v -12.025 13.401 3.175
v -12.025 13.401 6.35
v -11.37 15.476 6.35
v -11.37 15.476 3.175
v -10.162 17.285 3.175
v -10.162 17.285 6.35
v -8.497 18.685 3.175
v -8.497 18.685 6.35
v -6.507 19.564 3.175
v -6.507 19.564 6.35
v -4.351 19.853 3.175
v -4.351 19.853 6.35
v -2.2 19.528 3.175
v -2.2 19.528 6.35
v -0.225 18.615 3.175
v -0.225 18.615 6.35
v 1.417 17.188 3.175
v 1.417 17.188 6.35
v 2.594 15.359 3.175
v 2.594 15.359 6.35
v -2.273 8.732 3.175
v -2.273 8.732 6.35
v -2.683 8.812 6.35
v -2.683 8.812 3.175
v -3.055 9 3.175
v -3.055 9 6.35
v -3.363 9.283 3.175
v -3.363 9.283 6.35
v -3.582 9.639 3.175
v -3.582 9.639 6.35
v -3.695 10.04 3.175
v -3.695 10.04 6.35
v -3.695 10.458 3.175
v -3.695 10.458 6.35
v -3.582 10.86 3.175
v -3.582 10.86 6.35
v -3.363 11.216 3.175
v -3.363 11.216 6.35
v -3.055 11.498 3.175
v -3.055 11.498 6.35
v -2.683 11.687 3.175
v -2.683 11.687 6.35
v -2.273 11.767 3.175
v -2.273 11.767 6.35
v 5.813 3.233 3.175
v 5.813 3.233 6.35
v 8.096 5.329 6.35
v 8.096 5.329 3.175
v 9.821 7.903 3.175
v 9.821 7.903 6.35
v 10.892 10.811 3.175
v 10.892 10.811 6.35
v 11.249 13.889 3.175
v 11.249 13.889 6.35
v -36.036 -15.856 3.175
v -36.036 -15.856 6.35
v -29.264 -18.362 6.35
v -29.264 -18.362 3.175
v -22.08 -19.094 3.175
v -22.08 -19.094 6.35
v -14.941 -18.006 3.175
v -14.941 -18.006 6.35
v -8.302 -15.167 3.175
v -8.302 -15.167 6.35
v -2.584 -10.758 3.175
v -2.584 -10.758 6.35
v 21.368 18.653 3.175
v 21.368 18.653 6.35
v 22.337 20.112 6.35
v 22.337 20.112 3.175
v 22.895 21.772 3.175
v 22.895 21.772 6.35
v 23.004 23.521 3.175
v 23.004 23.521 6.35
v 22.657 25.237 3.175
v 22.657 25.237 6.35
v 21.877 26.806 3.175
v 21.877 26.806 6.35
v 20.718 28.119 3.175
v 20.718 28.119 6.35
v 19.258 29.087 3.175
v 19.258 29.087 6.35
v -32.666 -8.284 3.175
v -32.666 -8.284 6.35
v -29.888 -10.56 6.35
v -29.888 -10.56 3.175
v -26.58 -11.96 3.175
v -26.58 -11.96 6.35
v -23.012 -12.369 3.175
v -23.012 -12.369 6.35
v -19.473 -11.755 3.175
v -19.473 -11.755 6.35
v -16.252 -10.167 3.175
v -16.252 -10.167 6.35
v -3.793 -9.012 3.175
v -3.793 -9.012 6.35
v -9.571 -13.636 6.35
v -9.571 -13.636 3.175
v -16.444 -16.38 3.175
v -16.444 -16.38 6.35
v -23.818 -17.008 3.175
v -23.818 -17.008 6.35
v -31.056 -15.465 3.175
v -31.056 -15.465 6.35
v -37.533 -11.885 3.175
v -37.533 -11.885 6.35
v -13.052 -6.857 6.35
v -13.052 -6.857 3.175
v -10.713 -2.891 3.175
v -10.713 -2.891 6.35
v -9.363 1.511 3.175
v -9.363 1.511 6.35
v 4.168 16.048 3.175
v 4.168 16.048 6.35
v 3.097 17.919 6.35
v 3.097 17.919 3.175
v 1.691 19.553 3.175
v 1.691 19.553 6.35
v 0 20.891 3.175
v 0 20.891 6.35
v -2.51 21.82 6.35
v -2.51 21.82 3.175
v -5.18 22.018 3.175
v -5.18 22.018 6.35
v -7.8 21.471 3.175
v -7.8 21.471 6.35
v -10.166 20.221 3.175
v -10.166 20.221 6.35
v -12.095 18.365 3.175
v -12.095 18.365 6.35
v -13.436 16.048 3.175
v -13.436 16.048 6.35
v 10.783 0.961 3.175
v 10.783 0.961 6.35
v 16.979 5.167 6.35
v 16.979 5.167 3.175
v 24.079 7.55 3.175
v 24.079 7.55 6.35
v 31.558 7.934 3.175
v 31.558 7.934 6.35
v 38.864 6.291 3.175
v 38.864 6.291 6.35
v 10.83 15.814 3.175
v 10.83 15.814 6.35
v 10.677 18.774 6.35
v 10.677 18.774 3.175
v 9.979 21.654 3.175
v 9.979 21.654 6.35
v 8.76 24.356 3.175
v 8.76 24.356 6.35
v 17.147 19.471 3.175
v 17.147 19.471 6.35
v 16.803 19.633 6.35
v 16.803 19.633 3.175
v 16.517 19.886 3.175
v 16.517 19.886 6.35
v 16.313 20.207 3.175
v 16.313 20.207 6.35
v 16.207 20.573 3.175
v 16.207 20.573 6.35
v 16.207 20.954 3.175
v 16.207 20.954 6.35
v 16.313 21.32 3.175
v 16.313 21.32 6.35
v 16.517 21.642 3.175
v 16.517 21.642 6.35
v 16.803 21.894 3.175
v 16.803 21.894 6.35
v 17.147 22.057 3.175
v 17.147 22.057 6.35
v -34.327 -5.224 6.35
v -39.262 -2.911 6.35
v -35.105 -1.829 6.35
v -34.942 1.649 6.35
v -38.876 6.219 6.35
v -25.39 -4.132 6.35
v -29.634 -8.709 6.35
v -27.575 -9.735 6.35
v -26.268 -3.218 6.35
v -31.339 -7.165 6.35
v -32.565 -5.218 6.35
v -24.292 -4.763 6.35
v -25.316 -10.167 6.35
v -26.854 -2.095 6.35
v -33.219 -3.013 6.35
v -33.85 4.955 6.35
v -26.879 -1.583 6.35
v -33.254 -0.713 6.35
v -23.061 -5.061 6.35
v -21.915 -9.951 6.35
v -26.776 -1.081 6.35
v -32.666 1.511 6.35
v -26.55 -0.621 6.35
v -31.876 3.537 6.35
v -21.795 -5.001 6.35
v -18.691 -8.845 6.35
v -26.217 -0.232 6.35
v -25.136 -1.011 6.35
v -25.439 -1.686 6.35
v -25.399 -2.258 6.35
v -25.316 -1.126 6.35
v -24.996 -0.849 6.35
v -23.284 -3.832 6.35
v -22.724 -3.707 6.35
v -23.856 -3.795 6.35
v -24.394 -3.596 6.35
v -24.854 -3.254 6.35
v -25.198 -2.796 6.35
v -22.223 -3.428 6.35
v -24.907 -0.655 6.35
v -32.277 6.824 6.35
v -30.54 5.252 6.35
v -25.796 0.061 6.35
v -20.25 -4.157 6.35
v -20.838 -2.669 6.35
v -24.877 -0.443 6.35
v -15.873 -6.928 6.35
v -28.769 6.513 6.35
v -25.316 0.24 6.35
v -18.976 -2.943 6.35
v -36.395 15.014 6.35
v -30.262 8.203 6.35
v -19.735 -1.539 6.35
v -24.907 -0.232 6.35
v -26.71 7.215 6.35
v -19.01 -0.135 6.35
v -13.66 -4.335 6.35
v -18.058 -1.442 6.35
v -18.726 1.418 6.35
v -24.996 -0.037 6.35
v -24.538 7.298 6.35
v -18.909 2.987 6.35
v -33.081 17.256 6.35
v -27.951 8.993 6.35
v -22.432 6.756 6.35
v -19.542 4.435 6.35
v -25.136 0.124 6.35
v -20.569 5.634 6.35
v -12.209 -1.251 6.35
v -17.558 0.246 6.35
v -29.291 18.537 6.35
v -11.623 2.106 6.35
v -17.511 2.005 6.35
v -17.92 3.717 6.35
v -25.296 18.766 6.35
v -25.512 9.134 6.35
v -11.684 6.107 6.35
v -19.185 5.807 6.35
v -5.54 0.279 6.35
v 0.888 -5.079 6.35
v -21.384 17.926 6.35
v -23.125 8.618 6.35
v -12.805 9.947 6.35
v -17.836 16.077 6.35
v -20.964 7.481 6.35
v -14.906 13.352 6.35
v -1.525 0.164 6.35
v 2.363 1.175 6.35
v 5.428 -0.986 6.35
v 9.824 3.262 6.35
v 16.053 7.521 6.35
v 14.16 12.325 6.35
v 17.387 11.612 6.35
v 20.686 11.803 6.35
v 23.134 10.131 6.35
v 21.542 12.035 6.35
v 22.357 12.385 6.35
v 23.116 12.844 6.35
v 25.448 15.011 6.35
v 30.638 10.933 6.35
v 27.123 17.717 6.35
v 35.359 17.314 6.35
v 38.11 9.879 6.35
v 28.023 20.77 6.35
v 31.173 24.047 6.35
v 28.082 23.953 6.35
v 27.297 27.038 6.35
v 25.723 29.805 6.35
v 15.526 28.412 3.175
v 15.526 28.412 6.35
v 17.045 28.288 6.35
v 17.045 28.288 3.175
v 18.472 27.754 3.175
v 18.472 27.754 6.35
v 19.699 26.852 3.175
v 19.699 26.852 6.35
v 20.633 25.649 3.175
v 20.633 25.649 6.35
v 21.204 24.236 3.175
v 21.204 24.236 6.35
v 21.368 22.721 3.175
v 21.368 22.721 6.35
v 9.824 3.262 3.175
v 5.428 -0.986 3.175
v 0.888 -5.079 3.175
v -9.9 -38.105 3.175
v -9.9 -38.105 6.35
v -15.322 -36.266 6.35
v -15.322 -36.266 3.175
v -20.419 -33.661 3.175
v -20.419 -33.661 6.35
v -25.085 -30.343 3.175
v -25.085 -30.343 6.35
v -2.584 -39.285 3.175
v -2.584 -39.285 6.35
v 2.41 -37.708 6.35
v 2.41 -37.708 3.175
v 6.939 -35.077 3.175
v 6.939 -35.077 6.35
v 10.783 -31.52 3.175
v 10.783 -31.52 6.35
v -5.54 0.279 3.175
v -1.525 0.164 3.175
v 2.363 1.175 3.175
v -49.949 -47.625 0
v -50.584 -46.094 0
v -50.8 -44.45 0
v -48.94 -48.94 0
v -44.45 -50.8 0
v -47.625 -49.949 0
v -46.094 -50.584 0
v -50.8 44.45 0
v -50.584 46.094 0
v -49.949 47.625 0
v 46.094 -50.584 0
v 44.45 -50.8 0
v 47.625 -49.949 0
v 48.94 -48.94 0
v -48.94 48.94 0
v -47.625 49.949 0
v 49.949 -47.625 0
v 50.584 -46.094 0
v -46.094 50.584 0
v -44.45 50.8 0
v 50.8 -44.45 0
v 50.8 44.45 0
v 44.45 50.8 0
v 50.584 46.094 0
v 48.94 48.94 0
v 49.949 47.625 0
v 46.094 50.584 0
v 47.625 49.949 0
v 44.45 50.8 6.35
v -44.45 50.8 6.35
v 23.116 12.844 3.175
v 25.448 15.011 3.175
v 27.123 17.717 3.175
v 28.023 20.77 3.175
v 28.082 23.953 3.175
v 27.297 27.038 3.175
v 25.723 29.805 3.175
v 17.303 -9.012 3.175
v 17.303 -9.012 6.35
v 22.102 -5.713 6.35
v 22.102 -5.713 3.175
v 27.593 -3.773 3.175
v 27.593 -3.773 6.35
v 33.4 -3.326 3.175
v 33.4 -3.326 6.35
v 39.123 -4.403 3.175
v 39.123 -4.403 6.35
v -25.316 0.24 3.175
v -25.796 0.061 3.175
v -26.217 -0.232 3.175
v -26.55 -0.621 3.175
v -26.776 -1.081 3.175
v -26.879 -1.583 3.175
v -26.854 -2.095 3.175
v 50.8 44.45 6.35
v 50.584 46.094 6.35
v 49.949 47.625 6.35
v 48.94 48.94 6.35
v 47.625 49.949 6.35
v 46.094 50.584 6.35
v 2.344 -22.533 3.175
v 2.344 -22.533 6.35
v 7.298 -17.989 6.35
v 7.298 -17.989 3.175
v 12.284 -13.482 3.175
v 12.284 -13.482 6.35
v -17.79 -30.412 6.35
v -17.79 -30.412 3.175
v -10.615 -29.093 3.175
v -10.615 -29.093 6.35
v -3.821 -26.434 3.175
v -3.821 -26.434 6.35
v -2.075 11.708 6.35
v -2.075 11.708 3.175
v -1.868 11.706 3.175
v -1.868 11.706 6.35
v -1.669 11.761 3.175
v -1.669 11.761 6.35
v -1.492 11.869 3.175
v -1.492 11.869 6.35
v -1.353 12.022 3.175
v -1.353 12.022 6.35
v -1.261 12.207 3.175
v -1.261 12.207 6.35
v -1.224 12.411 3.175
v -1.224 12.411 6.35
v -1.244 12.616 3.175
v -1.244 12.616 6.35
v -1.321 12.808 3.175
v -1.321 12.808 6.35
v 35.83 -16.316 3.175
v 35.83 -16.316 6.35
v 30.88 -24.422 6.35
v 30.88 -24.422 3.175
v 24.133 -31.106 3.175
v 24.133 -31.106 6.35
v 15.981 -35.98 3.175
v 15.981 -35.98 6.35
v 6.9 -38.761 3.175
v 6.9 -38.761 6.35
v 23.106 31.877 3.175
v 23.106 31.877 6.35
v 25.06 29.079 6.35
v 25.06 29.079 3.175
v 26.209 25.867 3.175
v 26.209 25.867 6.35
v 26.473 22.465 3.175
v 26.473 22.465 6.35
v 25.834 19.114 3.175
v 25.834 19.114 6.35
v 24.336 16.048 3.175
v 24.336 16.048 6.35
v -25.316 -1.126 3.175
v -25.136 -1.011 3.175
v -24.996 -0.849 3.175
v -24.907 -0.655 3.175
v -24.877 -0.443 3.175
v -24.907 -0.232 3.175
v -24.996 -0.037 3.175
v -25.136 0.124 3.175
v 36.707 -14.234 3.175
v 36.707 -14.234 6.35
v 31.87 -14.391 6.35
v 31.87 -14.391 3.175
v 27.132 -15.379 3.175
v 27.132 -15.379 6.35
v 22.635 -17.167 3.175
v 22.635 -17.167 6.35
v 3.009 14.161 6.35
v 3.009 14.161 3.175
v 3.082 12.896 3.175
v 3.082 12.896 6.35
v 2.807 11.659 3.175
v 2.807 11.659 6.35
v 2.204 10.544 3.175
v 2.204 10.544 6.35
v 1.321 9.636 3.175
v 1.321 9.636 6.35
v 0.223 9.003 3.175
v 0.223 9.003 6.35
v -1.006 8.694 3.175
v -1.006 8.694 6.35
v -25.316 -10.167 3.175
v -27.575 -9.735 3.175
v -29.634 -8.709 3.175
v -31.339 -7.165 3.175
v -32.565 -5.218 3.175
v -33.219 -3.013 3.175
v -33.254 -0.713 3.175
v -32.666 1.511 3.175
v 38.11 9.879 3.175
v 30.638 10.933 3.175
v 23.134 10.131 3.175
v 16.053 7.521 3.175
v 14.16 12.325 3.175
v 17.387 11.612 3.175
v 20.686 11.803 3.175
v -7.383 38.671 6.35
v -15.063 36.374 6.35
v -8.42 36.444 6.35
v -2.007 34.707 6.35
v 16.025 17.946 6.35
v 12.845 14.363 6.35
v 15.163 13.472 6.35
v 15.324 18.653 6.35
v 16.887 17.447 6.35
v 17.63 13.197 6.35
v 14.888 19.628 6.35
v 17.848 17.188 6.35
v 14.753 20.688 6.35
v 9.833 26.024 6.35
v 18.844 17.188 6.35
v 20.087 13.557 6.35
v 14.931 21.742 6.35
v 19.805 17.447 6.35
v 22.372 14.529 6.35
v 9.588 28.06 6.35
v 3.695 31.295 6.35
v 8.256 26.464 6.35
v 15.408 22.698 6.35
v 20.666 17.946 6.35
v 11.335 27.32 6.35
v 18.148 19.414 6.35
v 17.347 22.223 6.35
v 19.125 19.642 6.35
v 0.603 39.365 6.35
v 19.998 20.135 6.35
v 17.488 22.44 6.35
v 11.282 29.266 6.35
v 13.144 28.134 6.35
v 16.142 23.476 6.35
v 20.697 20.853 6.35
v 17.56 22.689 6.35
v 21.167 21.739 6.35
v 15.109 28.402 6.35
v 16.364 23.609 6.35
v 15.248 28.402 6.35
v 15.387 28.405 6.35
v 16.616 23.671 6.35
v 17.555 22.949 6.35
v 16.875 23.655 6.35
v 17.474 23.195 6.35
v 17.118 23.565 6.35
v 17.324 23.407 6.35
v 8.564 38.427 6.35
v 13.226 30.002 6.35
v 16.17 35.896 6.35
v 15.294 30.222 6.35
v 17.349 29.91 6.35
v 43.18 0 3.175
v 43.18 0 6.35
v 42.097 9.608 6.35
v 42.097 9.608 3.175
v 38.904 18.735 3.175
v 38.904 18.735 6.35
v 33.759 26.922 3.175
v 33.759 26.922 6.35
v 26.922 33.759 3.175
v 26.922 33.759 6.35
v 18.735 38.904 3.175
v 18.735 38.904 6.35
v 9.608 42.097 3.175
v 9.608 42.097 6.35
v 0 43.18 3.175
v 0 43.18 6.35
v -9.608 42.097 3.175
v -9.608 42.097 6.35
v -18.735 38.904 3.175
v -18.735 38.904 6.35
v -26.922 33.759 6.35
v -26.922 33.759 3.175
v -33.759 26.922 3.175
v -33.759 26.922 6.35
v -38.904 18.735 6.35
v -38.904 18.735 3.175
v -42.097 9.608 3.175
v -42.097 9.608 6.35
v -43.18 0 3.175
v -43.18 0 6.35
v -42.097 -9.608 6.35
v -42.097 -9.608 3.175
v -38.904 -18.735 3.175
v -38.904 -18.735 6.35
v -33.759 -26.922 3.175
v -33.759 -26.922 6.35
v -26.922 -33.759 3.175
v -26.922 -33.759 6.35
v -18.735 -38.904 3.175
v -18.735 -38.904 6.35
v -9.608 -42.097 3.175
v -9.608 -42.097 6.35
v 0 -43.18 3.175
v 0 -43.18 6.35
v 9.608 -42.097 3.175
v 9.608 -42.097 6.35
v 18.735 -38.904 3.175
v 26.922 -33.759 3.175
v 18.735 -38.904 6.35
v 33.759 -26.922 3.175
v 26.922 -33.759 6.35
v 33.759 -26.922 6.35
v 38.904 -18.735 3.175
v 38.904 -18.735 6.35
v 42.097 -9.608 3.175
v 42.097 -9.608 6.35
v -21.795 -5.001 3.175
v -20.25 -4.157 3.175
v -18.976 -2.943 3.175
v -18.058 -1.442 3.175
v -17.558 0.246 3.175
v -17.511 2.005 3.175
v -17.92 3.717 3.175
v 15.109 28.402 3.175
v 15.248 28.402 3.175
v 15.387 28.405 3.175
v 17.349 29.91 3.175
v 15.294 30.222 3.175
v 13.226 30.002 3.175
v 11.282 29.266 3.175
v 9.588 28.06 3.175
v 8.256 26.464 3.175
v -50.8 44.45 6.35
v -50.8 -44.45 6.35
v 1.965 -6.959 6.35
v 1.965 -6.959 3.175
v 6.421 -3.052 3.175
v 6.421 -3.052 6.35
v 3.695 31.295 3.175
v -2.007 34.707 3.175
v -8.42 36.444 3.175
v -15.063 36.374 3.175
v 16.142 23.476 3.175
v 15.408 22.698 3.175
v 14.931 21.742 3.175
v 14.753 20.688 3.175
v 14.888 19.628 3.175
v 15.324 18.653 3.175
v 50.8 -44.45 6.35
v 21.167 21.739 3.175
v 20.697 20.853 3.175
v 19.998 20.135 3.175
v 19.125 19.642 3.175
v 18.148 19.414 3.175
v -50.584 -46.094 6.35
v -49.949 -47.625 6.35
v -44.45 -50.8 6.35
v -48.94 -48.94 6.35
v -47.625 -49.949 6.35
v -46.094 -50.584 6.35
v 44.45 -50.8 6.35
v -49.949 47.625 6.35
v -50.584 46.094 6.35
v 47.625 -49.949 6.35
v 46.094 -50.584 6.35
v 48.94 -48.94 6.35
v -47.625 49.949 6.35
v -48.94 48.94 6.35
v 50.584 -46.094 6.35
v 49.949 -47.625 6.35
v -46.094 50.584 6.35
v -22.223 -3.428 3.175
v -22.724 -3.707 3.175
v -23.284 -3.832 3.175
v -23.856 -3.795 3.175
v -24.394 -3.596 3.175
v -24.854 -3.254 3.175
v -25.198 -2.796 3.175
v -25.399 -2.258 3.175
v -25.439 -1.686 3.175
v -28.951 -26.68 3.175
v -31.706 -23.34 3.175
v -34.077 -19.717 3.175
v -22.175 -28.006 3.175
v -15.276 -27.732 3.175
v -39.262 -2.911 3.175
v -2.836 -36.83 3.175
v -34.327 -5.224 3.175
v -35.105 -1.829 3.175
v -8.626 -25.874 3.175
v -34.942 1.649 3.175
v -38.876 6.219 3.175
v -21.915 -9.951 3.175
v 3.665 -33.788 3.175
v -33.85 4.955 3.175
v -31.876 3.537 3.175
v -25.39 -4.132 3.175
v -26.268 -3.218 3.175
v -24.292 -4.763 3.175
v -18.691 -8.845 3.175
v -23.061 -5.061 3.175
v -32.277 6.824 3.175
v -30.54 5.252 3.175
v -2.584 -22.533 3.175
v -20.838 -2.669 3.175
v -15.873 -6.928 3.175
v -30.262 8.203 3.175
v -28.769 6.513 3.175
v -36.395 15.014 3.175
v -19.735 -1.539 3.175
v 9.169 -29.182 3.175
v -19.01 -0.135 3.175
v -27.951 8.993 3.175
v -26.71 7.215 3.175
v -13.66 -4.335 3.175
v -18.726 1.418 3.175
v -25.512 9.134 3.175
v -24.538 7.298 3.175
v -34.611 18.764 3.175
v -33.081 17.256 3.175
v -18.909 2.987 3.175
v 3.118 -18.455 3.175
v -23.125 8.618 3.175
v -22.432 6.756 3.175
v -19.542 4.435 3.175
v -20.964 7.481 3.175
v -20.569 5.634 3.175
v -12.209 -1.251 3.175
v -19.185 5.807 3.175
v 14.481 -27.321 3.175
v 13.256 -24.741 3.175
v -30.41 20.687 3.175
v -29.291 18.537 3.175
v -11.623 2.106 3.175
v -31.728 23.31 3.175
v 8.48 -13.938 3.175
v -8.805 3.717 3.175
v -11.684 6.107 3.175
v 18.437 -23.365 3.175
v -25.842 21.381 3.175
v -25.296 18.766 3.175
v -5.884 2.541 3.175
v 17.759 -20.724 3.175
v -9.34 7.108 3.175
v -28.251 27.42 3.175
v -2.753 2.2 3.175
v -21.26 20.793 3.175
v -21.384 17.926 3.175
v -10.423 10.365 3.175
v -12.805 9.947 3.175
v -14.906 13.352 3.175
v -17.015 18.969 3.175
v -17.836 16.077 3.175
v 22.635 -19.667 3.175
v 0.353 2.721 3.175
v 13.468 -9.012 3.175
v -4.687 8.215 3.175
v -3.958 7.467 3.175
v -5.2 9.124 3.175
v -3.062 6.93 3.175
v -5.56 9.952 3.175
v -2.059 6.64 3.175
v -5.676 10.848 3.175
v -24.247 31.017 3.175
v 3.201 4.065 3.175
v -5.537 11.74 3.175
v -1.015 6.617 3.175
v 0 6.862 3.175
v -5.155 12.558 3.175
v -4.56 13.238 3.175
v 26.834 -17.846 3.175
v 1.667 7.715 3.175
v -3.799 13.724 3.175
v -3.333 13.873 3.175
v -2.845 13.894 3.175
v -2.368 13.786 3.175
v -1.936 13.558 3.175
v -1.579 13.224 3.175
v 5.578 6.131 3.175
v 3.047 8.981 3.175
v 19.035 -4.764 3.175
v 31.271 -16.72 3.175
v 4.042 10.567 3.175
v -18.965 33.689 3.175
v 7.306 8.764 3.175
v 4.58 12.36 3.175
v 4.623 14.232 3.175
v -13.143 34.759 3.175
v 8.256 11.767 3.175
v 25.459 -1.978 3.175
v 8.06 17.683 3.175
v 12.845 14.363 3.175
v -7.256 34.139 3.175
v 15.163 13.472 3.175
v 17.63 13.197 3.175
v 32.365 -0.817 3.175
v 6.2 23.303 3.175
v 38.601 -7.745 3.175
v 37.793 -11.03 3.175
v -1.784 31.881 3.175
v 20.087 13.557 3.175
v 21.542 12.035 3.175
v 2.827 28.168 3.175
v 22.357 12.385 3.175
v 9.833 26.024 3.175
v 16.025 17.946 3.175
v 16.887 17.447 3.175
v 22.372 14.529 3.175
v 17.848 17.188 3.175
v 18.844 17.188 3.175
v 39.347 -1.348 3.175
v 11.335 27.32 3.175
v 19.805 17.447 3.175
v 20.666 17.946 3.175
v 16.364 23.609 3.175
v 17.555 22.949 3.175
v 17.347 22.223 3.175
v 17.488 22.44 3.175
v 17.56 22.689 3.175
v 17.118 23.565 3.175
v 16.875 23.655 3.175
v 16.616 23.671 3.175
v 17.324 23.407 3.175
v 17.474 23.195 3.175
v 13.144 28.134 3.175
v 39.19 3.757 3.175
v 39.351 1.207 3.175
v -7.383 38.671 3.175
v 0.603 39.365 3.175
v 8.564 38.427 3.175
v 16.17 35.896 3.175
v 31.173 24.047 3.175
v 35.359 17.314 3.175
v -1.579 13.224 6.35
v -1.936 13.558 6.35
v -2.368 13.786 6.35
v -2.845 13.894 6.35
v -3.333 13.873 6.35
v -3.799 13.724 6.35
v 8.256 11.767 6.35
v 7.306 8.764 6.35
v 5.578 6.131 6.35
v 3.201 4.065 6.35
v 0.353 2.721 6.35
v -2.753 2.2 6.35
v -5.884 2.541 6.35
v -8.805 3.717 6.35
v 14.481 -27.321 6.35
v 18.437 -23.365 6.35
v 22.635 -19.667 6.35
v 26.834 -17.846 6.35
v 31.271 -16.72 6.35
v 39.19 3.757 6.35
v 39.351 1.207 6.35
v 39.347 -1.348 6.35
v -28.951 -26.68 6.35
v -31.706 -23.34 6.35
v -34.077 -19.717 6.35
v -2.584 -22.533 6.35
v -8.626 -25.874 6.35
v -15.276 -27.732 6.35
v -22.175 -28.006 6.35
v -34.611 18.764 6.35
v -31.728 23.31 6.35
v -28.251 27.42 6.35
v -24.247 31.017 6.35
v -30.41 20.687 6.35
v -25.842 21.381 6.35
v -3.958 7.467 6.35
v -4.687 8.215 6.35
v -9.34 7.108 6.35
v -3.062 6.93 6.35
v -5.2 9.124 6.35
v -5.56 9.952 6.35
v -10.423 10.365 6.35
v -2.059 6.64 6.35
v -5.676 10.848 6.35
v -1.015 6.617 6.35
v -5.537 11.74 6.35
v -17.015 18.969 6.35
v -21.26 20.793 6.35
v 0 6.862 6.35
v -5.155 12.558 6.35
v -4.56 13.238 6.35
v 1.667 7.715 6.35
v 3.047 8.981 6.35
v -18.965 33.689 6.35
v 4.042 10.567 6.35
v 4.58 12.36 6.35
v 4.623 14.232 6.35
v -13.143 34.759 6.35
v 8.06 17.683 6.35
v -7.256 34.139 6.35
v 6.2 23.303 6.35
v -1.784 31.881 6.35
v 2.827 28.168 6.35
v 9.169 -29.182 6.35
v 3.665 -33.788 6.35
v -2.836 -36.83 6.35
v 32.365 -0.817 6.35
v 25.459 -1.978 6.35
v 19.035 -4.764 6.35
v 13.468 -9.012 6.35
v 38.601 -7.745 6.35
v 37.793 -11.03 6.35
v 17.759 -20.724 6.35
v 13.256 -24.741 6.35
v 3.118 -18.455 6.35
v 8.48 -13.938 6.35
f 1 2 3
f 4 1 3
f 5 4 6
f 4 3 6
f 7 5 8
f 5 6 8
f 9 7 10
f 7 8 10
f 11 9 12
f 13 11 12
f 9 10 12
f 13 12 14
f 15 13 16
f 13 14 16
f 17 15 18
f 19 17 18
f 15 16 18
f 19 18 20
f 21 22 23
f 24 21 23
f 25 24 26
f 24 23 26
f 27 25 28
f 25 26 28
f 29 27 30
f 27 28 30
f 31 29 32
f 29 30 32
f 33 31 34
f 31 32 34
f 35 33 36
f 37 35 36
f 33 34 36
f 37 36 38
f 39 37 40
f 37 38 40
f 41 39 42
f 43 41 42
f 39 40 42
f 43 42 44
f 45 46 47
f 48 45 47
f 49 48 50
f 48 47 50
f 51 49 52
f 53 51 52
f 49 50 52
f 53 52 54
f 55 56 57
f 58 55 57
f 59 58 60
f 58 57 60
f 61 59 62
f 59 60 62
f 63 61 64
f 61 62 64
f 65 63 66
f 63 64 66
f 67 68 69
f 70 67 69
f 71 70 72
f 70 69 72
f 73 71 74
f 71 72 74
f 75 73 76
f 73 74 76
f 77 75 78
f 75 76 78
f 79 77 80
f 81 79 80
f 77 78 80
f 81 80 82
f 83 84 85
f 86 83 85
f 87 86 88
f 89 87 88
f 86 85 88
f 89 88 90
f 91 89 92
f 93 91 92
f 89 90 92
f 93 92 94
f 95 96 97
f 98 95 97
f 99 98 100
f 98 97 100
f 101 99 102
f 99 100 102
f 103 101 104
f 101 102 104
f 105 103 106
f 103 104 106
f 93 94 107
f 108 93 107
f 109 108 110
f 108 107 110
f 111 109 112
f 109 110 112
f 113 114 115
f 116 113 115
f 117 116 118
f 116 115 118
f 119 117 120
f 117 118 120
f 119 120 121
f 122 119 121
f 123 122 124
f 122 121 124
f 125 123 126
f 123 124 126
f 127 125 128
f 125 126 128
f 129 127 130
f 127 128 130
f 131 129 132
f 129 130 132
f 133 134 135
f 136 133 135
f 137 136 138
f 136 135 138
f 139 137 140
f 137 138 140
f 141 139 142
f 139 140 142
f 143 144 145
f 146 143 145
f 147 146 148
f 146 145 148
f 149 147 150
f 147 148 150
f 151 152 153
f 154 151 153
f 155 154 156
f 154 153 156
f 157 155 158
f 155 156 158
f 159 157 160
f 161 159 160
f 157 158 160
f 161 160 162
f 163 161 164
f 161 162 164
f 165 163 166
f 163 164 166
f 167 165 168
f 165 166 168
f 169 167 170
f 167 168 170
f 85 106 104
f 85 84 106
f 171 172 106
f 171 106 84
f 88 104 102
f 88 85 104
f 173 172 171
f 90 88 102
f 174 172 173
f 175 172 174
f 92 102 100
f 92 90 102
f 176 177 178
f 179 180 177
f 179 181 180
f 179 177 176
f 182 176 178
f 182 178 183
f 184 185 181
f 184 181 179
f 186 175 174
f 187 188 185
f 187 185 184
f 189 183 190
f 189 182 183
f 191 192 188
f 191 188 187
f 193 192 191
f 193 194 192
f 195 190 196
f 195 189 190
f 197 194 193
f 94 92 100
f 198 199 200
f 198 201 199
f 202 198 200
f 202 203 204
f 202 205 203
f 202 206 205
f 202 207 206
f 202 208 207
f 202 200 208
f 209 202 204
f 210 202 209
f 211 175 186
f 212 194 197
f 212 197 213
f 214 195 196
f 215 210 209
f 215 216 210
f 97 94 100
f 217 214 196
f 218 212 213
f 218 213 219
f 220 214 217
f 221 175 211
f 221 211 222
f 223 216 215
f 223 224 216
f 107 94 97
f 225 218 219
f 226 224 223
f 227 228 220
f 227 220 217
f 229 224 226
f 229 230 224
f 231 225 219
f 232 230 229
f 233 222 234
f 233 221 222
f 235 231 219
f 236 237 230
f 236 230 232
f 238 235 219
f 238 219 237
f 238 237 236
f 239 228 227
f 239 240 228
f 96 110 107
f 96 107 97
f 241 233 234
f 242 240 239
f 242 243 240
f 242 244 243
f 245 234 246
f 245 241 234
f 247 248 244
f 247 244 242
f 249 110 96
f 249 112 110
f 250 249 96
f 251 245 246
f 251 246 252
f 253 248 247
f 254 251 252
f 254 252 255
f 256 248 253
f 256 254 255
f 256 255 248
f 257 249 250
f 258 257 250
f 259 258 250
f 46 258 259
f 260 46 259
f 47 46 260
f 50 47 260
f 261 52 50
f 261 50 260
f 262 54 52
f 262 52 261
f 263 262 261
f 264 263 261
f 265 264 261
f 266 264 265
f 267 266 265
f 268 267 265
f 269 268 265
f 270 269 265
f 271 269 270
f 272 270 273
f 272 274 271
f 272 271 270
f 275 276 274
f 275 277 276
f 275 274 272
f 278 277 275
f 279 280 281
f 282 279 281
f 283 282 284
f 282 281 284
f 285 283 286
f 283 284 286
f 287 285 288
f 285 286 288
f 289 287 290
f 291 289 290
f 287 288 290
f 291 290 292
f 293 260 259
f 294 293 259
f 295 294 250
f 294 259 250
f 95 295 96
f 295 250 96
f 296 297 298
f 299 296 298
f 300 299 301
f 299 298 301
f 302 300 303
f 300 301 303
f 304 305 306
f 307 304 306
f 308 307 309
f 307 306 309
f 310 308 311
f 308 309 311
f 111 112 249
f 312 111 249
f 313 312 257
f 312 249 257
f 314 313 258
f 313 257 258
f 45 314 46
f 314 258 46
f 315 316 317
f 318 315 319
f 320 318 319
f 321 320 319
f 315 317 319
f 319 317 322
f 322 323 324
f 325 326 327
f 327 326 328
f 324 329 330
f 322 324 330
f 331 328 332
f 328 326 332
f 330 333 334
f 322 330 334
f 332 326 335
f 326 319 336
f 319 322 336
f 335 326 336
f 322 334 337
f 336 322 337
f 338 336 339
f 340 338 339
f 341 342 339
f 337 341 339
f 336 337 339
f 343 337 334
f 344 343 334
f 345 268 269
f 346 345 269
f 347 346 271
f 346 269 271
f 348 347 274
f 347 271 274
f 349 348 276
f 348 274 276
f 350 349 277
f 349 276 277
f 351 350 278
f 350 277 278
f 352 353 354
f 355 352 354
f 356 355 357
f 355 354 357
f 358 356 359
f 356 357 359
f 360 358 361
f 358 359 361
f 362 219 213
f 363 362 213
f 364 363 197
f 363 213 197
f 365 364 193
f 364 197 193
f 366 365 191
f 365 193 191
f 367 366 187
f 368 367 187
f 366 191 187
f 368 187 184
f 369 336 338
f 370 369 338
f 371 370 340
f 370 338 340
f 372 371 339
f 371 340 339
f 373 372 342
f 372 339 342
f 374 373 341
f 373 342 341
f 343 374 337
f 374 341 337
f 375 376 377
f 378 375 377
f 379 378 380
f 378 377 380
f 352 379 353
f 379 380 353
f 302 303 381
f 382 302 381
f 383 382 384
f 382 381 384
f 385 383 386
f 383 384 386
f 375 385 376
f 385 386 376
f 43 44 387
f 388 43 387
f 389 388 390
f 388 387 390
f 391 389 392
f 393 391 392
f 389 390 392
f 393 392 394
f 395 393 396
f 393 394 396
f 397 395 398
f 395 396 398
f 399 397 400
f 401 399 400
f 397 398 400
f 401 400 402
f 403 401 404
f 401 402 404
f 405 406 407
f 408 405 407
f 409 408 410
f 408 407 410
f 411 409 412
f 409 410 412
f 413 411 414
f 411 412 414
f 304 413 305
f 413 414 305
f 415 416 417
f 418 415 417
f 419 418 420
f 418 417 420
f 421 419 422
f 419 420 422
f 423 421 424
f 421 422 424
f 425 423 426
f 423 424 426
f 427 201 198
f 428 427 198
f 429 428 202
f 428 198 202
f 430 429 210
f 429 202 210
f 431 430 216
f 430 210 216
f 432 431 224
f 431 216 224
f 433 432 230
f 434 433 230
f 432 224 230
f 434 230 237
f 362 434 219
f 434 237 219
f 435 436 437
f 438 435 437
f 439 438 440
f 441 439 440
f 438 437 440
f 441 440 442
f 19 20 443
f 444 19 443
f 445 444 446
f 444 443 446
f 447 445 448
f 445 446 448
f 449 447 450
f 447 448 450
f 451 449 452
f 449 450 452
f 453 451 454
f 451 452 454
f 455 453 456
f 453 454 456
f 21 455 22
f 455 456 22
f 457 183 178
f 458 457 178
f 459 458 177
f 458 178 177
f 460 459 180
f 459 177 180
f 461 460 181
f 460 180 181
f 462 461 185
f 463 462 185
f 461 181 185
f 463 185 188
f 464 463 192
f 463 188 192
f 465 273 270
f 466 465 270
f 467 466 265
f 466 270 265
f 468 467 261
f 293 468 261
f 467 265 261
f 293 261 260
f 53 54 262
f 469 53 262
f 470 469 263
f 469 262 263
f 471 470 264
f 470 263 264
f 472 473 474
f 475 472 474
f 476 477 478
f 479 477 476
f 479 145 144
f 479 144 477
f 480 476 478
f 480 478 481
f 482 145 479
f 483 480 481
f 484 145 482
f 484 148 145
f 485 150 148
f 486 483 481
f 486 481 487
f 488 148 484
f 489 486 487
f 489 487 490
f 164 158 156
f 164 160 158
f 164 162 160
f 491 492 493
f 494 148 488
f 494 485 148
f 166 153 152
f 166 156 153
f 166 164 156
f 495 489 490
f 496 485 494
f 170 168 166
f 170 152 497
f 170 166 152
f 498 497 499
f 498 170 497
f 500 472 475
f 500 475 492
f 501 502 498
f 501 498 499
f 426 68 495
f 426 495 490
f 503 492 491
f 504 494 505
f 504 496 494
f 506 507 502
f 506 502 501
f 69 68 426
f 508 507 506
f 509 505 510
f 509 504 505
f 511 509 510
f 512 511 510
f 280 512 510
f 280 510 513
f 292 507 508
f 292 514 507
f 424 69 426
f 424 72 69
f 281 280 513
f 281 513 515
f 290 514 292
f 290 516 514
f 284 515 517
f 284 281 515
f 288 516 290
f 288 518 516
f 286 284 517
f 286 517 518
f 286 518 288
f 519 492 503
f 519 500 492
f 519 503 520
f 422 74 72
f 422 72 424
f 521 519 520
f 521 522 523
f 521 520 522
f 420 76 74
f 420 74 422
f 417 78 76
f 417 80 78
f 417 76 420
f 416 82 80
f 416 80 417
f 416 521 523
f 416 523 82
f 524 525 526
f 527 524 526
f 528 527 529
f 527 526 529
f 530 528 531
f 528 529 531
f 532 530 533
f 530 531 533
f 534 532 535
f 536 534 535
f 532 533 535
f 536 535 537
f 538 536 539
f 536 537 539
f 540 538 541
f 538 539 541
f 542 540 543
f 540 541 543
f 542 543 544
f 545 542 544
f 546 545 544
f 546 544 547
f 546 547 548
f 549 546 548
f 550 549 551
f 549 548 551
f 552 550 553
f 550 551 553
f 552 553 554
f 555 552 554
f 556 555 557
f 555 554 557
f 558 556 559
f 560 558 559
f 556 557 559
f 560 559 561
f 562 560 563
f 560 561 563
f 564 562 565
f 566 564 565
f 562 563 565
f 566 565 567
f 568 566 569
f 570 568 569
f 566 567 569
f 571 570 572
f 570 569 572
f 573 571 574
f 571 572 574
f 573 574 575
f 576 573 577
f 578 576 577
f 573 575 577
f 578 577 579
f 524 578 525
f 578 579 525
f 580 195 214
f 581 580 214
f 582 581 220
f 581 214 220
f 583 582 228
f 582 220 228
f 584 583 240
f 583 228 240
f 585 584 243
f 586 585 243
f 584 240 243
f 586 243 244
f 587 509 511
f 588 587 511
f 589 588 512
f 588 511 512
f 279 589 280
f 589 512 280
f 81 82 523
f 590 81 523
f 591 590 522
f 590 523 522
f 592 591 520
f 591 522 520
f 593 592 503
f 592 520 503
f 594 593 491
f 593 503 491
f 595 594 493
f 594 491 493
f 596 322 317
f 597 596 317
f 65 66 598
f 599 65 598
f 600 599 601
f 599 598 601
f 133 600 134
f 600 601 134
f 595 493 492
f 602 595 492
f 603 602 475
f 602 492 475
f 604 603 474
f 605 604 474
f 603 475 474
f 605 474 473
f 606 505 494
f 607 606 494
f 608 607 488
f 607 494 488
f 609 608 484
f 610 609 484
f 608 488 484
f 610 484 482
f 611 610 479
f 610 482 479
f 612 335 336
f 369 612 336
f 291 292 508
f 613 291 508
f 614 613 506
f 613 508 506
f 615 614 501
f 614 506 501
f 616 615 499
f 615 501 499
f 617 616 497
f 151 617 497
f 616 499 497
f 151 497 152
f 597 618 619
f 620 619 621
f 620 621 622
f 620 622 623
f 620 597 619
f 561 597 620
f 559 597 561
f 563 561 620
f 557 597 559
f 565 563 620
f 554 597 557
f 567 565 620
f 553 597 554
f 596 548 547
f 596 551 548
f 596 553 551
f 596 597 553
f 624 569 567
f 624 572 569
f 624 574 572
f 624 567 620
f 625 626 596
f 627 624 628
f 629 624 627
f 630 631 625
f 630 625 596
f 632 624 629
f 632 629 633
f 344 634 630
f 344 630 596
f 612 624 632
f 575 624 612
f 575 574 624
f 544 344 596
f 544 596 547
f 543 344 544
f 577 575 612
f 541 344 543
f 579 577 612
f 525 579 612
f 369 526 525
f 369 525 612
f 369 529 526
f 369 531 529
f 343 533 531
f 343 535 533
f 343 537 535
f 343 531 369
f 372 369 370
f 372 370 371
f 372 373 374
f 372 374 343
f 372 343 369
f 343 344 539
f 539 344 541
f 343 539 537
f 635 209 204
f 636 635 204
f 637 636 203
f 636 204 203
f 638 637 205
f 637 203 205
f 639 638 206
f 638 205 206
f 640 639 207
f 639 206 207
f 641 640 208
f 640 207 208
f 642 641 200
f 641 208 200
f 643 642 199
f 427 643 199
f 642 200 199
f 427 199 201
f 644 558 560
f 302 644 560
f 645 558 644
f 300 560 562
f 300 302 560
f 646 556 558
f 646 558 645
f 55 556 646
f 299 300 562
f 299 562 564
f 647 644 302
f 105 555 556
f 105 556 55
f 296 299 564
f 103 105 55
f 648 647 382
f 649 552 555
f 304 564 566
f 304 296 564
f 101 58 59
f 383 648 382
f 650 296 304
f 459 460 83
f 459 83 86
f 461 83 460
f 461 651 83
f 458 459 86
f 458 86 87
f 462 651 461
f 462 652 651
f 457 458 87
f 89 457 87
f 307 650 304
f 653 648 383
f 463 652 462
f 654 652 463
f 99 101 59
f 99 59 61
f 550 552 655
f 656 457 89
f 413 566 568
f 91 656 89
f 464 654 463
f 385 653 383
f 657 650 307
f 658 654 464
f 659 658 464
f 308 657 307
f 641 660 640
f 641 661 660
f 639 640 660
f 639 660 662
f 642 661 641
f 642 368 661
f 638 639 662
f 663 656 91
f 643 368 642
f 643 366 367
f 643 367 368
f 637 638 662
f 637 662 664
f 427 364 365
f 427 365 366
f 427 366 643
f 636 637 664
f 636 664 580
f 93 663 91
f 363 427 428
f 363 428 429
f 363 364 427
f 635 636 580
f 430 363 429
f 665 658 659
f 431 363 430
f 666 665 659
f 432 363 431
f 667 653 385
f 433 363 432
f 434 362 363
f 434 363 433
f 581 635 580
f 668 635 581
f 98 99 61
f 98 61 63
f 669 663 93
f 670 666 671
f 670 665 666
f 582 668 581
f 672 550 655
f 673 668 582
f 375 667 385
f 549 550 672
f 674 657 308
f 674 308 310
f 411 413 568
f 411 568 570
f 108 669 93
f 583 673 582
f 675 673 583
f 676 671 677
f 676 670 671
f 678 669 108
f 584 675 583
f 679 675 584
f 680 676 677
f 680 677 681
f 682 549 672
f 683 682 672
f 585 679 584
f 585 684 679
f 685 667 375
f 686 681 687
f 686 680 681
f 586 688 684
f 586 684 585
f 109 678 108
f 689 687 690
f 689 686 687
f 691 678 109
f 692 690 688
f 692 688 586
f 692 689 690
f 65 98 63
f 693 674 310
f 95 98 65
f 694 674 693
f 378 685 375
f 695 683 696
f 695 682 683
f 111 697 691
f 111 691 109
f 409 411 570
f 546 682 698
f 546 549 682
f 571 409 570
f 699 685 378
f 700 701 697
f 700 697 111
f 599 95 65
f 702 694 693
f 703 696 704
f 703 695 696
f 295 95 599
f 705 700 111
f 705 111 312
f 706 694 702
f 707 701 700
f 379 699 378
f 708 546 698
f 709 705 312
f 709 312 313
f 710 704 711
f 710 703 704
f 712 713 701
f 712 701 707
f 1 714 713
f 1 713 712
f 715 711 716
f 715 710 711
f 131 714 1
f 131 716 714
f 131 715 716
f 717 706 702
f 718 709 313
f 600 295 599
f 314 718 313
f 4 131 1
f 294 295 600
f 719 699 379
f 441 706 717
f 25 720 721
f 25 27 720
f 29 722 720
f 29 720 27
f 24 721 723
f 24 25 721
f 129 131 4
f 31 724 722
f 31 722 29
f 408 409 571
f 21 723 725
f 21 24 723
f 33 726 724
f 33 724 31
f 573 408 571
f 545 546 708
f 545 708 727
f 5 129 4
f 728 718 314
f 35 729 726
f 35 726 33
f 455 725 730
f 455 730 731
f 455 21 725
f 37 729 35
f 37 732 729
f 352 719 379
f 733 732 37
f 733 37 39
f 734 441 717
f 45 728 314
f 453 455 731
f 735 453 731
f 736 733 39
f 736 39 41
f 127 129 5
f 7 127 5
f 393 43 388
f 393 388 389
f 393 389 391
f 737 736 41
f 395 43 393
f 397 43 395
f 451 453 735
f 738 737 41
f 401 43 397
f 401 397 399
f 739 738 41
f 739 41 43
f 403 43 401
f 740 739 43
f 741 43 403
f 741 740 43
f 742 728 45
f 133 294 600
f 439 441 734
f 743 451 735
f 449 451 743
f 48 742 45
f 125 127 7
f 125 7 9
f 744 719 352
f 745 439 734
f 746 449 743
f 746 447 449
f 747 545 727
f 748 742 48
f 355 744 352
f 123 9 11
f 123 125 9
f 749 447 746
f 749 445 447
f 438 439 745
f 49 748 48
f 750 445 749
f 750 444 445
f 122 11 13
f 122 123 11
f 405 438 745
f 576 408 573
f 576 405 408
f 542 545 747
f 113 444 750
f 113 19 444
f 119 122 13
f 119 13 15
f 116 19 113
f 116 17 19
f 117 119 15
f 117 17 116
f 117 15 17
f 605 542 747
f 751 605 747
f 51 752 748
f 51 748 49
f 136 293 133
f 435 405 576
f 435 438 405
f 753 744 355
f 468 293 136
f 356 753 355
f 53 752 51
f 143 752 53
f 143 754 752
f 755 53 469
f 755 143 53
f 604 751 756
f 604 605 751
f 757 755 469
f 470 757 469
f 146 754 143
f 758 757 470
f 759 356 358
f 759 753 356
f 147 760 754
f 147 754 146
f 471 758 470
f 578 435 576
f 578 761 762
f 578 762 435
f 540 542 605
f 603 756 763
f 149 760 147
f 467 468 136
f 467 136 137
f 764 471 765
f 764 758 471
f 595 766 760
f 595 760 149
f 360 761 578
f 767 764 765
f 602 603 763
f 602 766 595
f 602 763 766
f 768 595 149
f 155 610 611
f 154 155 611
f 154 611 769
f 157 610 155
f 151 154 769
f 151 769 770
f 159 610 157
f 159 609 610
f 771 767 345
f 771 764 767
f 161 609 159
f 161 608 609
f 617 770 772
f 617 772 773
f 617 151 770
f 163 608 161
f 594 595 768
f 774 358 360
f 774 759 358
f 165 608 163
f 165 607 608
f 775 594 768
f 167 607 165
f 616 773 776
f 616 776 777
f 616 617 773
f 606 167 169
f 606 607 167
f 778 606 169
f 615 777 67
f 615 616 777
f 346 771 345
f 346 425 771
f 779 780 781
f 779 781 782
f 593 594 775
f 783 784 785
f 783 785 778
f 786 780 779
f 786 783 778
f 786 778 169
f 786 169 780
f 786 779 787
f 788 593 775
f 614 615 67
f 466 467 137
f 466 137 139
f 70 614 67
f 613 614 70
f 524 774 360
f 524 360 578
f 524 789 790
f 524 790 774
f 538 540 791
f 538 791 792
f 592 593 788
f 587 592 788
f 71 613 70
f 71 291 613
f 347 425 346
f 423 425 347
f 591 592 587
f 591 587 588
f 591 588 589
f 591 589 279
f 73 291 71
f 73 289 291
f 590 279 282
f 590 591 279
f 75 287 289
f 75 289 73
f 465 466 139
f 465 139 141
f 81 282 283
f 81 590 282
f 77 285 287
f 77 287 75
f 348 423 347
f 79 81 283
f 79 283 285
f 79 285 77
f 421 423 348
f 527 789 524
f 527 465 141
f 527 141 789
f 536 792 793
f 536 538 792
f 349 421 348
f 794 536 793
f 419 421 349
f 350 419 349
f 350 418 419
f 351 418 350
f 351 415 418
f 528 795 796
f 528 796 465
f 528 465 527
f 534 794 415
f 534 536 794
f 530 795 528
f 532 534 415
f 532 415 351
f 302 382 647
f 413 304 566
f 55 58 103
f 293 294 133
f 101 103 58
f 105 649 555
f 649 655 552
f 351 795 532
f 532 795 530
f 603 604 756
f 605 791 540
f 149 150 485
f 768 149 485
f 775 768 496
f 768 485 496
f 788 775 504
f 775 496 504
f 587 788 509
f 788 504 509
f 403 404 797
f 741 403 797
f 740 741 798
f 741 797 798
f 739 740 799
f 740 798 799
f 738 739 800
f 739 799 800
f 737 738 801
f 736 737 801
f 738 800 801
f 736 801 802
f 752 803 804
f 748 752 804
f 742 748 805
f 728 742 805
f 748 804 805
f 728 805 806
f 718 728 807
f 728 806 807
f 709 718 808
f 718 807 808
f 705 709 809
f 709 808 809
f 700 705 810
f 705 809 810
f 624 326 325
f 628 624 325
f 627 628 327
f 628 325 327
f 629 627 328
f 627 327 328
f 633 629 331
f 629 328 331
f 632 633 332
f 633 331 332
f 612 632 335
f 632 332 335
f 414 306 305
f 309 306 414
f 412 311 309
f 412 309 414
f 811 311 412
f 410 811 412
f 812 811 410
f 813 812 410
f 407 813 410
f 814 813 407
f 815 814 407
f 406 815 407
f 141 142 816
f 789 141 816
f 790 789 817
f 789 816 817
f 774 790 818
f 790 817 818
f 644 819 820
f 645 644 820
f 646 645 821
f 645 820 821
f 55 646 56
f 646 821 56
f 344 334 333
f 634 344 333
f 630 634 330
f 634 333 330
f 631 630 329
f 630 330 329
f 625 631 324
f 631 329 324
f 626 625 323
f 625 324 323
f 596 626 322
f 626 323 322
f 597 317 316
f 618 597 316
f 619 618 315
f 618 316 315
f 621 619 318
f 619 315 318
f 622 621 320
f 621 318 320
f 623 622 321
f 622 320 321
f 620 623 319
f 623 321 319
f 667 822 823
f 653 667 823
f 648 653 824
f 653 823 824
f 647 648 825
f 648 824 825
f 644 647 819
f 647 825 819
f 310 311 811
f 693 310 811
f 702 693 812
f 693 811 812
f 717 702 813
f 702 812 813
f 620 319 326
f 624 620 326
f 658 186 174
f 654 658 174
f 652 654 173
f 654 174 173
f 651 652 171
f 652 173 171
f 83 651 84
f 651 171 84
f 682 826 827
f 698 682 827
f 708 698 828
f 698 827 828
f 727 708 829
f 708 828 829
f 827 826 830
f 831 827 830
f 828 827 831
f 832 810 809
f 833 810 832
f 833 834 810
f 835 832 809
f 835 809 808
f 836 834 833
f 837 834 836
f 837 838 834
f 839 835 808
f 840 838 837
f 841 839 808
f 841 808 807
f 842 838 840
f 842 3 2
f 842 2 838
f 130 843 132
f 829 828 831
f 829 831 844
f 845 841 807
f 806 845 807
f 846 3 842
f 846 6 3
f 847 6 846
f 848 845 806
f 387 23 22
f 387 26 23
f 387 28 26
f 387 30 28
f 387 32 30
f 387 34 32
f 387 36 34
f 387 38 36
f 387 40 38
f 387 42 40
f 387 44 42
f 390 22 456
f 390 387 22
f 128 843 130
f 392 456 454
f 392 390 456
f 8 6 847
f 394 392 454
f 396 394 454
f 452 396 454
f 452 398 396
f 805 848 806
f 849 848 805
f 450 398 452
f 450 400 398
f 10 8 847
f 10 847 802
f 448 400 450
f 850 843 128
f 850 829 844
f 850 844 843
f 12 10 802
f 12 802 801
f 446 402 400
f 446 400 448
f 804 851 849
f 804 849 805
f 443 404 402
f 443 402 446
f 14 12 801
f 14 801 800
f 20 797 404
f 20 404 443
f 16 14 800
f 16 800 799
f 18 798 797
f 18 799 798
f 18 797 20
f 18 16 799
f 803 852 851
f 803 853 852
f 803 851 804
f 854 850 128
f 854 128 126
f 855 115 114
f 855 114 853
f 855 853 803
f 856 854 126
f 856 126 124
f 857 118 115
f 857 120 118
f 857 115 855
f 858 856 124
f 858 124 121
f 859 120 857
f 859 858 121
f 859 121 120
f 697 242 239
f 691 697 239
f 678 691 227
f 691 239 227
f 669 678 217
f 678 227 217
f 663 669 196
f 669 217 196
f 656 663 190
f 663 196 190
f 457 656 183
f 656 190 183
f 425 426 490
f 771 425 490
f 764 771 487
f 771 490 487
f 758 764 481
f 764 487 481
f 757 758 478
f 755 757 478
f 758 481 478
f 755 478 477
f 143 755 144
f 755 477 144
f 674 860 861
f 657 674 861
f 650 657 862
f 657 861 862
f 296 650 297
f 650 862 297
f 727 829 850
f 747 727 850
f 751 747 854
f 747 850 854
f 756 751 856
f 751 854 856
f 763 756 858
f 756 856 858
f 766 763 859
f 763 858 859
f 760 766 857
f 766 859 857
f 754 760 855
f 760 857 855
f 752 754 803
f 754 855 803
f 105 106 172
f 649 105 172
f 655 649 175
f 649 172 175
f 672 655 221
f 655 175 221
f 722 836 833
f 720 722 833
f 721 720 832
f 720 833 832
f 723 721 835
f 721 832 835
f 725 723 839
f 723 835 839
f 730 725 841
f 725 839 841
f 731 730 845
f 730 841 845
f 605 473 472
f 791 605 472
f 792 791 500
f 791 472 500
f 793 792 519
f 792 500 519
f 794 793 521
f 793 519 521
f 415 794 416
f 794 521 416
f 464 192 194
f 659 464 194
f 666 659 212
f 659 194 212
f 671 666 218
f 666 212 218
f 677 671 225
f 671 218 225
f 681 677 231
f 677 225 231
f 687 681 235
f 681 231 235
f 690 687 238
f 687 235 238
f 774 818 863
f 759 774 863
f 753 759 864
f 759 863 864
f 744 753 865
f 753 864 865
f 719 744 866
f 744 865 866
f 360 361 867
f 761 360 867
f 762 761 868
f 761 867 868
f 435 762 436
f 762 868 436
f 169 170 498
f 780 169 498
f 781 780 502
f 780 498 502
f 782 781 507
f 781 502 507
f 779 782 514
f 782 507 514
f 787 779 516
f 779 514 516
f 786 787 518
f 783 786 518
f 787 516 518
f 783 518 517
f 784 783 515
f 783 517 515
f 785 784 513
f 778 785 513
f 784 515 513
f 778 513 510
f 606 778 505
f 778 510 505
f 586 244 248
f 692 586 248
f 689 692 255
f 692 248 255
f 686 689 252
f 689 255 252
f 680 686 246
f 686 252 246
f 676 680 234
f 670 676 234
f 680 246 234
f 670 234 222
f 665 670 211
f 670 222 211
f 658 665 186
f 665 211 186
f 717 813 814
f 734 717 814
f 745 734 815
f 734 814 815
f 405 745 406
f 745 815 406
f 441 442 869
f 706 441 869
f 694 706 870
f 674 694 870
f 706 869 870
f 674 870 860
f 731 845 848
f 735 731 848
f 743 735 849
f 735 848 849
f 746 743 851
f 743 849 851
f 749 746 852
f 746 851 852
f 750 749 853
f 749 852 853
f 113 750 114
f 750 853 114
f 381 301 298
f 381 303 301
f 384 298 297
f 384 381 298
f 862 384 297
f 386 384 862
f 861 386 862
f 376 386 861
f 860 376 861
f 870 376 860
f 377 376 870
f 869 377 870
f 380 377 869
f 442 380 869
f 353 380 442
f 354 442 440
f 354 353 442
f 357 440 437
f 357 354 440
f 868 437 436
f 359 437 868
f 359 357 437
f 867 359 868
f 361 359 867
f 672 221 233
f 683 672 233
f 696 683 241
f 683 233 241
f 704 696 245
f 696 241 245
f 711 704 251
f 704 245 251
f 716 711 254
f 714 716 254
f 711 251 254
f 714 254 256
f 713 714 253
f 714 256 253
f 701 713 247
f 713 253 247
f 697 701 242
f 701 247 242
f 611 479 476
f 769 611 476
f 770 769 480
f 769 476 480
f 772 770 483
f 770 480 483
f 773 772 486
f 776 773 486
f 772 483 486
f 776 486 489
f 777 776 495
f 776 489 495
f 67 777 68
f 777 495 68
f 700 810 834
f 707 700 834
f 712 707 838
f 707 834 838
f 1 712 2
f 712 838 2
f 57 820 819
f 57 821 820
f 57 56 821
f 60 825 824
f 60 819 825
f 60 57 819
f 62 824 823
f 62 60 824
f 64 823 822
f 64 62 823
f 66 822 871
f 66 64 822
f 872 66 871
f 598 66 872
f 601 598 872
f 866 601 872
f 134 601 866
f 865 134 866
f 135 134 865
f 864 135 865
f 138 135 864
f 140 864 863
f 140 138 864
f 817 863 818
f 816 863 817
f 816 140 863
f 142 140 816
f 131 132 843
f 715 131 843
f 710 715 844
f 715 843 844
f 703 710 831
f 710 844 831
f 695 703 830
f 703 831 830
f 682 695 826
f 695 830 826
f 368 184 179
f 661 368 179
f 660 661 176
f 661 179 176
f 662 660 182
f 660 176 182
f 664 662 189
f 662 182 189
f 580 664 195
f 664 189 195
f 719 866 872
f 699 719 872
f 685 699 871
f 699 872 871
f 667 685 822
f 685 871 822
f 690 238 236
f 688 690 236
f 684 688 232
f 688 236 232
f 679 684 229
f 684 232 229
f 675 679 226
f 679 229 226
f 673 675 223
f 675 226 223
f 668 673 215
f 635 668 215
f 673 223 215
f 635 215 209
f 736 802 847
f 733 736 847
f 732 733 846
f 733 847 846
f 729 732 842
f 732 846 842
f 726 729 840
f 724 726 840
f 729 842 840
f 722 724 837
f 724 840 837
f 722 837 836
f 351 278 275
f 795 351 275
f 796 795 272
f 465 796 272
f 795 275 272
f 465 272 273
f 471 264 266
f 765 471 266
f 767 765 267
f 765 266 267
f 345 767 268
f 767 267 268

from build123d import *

# Parameters (mm, degrees)
F1_DEPTH = 6.35
F2_R     = 43.18
F3_DEPTH = 3.175


with BuildPart() as f1:
    # F0 (on Top) → F1 (new body)
    with BuildSketch(Plane.XY):
        with BuildLine():
            Line((44.45, 50.8), (-44.45, 50.8))
            ThreePointArc((-44.45, 50.8), (-48.940128, 48.940128), (-50.8, 44.45))
            Line((-50.8, 44.45), (-50.8, -44.45))
            ThreePointArc((-50.8, -44.45), (-48.940128, -48.940128), (-44.45, -50.8))
            Line((-44.45, -50.8), (44.45, -50.8))
            ThreePointArc((44.45, -50.8), (48.940128, -48.940128), (50.8, -44.45))
            Line((50.8, -44.45), (50.8, 44.45))
            ThreePointArc((50.8, 44.45), (48.940128, 48.940128), (44.45, 50.8))
        make_face()
    extrude(amount=F1_DEPTH)

    # F2 (on face) → F3 (cut)
    with BuildSketch(Plane.XY.offset(6.35)):
        Circle(F2_R)
        with BuildLine():
            ThreePointArc((35.830027, -16.315821), (20.204607, -33.790098), (-2.58374, -39.285127))
            ThreePointArc((-2.58374, -39.285127), (4.747118, -36.517246), (10.782814, -31.519946))
            ThreePointArc((10.782814, -31.519946), (16.427451, -25.311935), (22.634907, -19.666689))
            ThreePointArc((22.634907, -19.666689), (29.030027, -17.194081), (35.830027, -16.315821))
        make_face(mode=Mode.SUBTRACT)
        with BuildLine():
            ThreePointArc((-9.899706, -38.105022), (-17.917908, -35.056319), (-25.085457, -30.343315))
            ThreePointArc((-25.085457, -30.343315), (-10.61459, -29.092618), (2.344406, -22.532538))
            ThreePointArc((2.344406, -22.532538), (9.787045, -15.731443), (17.303402, -9.011908))
            ThreePointArc((17.303402, -9.011908), (27.593343, -3.772844), (39.123036, -4.402834))
            ThreePointArc((39.123036, -4.402834), (38.232302, -9.396167), (36.706991, -14.233543))
            ThreePointArc((36.706991, -14.233543), (29.479665, -14.782685), (22.634907, -17.167022))
            ThreePointArc((22.634907, -17.167022), (15.458512, -22.677295), (9.168963, -29.181547))
            ThreePointArc((9.168963, -29.181547), (0.512727, -35.519703), (-9.899706, -38.105022))
        make_face(mode=Mode.SUBTRACT)
        with BuildLine():
            ThreePointArc((-28.951135, -26.680118), (-32.941202, -21.560939), (-36.035977, -15.855765))
            ThreePointArc((-36.035977, -15.855765), (-18.476277, -18.776194), (-2.58374, -10.757512))
            ThreePointArc((-2.58374, -10.757512), (4.205031, -5.018711), (10.782814, 0.960756))
            ThreePointArc((10.782814, 0.960756), (24.078577, 7.549898), (38.864055, 6.291432))
            ThreePointArc((38.864055, 6.291432), (39.291598, 2.483397), (39.34691, -1.348164))
            ThreePointArc((39.34691, -1.348164), (25.459159, -1.978206), (13.467762, -9.011908))
            ThreePointArc((13.467762, -9.011908), (5.843991, -16.249448), (-2.58374, -22.532538))
            ThreePointArc((-2.58374, -22.532538), (-15.275761, -27.732057), (-28.951135, -26.680118))
        make_face(mode=Mode.SUBTRACT)
        with BuildLine():
            ThreePointArc((-3.792618, -9.011908), (-20.108035, -16.966318), (-37.533355, -11.884619))
            ThreePointArc((-37.533355, -11.884619), (-39.334778, 1.664978), (-36.394785, 15.013879))
            ThreePointArc((-36.394785, 15.013879), (-19.548147, 17.120851), (-11.623084, 2.106128))
            ThreePointArc((-11.623084, 2.106128), (-15.8727, -6.927744), (-25.315939, -10.167394))
            ThreePointArc((-25.315939, -10.167394), (-32.018706, -6.233835), (-32.666095, 1.510897))
            ThreePointArc((-32.666095, 1.510897), (-27.765063, 6.938703), (-20.569334, 5.633835))
            ThreePointArc((-20.569334, 5.633835), (-18.810376, 0.630934), (-22.223454, -3.427865))
            ThreePointArc((-22.223454, -3.427865), (-24.636431, -3.441846), (-25.315939, -1.12648))
            ThreePointArc((-25.315939, -1.12648), (-24.87664, -0.443257), (-25.315939, 0.239966))
            ThreePointArc((-25.315939, 0.239966), (-26.550153, -0.620979), (-26.853859, -2.094843))
            ThreePointArc((-26.853859, -2.094843), (-24.8636, -4.486405), (-21.79506, -5.000961))
            ThreePointArc((-21.79506, -5.000961), (-18.057747, -1.44174), (-17.920237, 3.717394))
            ThreePointArc((-17.920237, 3.717394), (-25.512349, 9.134125), (-33.85007, 4.955185))
            ThreePointArc((-33.85007, 4.955185), (-35.104751, -1.829456), (-32.666095, -8.283798))
            ThreePointArc((-32.666095, -8.283798), (-24.810949, -12.292556), (-16.25191, -10.167394))
            ThreePointArc((-16.25191, -10.167394), (-11.765874, -4.942736), (-9.363333, 1.510897))
            ThreePointArc((-9.363333, 1.510897), (-1.52454, 0.163596), (5.813062, 3.233041))
            ThreePointArc((5.813062, 3.233041), (9.821154, 7.902724), (11.248579, 13.888808))
            ThreePointArc((11.248579, 13.888808), (15.748865, 11.857558), (20.686024, 11.802628))
            ThreePointArc((20.686024, 11.802628), (21.955711, 12.195598), (23.115785, 12.844257))
            ThreePointArc((23.115785, 12.844257), (28.022683, 20.770437), (25.723282, 29.804525))
            ThreePointArc((25.723282, 29.804525), (33.435684, 20.785858), (38.110449, 9.878793))
            ThreePointArc((38.110449, 9.878793), (23.134356, 10.130821), (9.823904, 3.26214))
            ThreePointArc((9.823904, 3.26214), (3.175845, -3.052608), (-3.792618, -9.011908))
        make_face(mode=Mode.SUBTRACT)
        with BuildLine():
            ThreePointArc((0, 20.890631), (-7.799723, 21.471197), (-13.435853, 16.048396))
            ThreePointArc((-13.435853, 16.048396), (-23.530574, 21.247029), (-34.610562, 18.764484))
            ThreePointArc((-34.610562, 18.764484), (-30.059834, 25.424462), (-24.247281, 31.017193))
            ThreePointArc((-24.247281, 31.017193), (-1.783652, 31.880624), (8.255853, 11.766737))
            ThreePointArc((8.255853, 11.766737), (1.823287, 3.295446), (-8.805102, 3.717394))
            ThreePointArc((-8.805102, 3.717394), (-9.814889, 8.75871), (-12.02473, 13.401031))
            ThreePointArc((-12.02473, 13.401031), (-5.439061, 19.784732), (2.594116, 15.358591))
            ThreePointArc((2.594116, 15.358591), (2.204285, 10.544215), (-2.272845, 8.73162))
            ThreePointArc((-2.272845, 8.73162), (-3.709614, 10.249179), (-2.272845, 11.766737))
            ThreePointArc((-2.272845, 11.766737), (-1.417286, 11.940645), (-1.321004, 12.808375))
            ThreePointArc((-1.321004, 12.808375), (-2.368046, 13.786265), (-3.799384, 13.724298))
            ThreePointArc((-3.799384, 13.724298), (-5.537072, 11.740216), (-5.199529, 9.124454))
            ThreePointArc((-5.199529, 9.124454), (-3.062346, 6.930124), (0, 6.861728))
            ThreePointArc((0, 6.861728), (4.041718, 10.566846), (4.168157, 16.048396))
            ThreePointArc((4.168157, 16.048396), (2.432702, 18.769606), (0, 20.890631))
        make_face(mode=Mode.SUBTRACT)
        with BuildLine():
            ThreePointArc((19.258106, 29.087057), (13.226177, 30.002315), (8.255853, 26.46427))
            ThreePointArc((8.255853, 26.46427), (-2.006518, 34.7072), (-15.063429, 36.374304))
            ThreePointArc((-15.063429, 36.374304), (4.607369, 39.099476), (23.105911, 31.87654))
            ThreePointArc((23.105911, 31.87654), (26.454351, 24.174835), (24.335554, 16.048396))
            ThreePointArc((24.335554, 16.048396), (17.630398, 13.197088), (10.830184, 15.813604))
            ThreePointArc((10.830184, 15.813604), (10.39549, 20.23006), (8.760267, 24.355602))
            ThreePointArc((8.760267, 24.355602), (11.335212, 27.319516), (15.109342, 28.40168))
            ThreePointArc((15.109342, 28.40168), (15.317869, 28.40325), (15.526231, 28.411666))
            ThreePointArc((15.526231, 28.411666), (19.698978, 26.851735), (21.36774, 22.721307))
            ThreePointArc((21.36774, 22.721307), (19.997953, 20.134608), (17.147247, 19.470681))
            ThreePointArc((17.147247, 19.470681), (16.193526, 20.763747), (17.147247, 22.056814))
            ThreePointArc((17.147247, 22.056814), (17.406668, 23.306557), (16.141526, 23.475597))
            ThreePointArc((16.141526, 23.475597), (14.803341, 21.221821), (15.323924, 18.652923))
            ThreePointArc((15.323924, 18.652923), (18.345832, 17.155036), (21.36774, 18.652923))
            ThreePointArc((21.36774, 18.652923), (22.886635, 24.390358), (19.258106, 29.087057))
        make_face(mode=Mode.SUBTRACT)
    extrude(amount=-F3_DEPTH, mode=Mode.SUBTRACT)


solid = f1.part
